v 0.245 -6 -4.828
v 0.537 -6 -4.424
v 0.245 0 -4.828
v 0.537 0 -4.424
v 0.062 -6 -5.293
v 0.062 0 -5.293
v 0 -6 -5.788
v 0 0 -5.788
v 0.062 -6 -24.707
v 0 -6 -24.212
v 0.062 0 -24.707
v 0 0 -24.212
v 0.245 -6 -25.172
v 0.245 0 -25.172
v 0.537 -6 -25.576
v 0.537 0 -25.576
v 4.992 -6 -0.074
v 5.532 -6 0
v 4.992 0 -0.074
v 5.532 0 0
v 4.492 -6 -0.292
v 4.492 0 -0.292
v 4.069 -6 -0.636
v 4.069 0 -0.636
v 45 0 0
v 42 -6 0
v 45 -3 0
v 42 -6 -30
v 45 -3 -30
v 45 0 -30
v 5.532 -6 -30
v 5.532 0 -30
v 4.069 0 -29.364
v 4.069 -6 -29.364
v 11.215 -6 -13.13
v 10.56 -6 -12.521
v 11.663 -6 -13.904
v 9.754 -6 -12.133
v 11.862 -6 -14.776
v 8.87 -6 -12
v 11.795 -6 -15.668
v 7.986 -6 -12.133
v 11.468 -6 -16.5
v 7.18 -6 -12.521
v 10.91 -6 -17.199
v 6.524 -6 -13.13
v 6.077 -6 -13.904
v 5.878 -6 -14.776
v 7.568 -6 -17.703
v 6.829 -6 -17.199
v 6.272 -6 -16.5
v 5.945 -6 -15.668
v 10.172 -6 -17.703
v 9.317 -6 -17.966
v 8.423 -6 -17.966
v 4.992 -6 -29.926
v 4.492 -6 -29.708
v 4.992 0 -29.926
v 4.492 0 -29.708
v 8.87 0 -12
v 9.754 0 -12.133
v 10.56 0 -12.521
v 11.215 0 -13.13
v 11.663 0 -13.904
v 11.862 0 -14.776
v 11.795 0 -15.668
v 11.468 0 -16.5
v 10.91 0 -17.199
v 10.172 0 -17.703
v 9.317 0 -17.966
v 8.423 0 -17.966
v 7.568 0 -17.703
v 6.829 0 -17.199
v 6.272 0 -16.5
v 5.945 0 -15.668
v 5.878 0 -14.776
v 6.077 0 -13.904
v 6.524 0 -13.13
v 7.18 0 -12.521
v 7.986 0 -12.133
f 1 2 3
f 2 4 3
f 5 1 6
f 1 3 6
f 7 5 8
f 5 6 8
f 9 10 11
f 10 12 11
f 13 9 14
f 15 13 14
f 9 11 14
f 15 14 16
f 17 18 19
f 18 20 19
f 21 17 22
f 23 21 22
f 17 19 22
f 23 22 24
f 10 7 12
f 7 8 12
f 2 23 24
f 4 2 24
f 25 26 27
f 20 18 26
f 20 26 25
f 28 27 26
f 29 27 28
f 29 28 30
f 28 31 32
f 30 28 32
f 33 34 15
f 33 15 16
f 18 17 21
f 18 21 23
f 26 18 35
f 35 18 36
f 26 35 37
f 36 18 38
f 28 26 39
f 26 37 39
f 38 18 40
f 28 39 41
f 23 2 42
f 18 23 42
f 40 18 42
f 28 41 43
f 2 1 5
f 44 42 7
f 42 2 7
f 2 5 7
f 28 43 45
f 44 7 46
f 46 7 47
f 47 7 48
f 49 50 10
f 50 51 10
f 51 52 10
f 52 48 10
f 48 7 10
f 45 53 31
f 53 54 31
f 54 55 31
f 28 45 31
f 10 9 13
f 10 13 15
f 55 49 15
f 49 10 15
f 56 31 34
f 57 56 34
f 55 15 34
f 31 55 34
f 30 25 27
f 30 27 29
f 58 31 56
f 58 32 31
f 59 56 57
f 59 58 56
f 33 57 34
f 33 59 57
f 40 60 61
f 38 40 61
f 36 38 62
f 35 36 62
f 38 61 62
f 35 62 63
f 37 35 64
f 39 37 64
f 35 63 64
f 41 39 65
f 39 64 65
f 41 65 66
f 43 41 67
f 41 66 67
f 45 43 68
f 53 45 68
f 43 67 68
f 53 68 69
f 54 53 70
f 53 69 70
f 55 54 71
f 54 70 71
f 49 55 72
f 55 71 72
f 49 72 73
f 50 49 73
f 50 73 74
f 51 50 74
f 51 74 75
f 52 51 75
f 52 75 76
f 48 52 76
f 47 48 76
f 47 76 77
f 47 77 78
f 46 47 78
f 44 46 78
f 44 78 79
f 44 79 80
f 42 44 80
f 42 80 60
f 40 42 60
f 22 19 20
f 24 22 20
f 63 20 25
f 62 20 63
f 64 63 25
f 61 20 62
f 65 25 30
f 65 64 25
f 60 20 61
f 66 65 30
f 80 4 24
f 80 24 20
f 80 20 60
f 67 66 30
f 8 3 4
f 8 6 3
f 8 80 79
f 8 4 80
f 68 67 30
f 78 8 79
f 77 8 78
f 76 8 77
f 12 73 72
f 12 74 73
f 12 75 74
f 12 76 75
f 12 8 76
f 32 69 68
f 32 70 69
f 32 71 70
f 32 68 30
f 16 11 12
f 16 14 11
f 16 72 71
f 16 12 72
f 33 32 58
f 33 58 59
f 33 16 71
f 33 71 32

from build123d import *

# Parameters (mm, degrees)
SKETCH_1_W          = 30
SKETCH_1_H          = 6
EXTRUDE_1_DEPTH     = 45
CHAMFER_1_SIZE      = 3
SKETCH_2_R          = 3
CUT_EXTRUDE_1_DEPTH = 55.415071442
CHAMFER_2_SIZE      = 5
CHAMFER_2_SIZE2     = 4.662575431
FILLET_1_R          = 2


with BuildPart() as part:
    # Эскиз1 → Вытянуть1 (new body)
    with BuildSketch(Plane(origin=(0, 0, 0), x_dir=(0, 0, -1), z_dir=(1, 0, 0))):
        with Locations((15, -3)):
            Rectangle(SKETCH_1_W, SKETCH_1_H)
    extrude(amount=EXTRUDE_1_DEPTH)

    # Фаска1
    chamfer_1_edges = [part.edges().sort_by_distance(p)[0] for p in [
        (45, -6, -15),
    ]]
    chamfer(chamfer_1_edges, length=CHAMFER_1_SIZE)

    # Эскиз2 → Вырез-Вытянуть1 (cut, through all)
    with BuildSketch(Plane(origin=(0, 0, 0), x_dir=(-1, 0, 0), z_dir=(0, 1, 0))):
        with Locations(Location((-8.86993337, -14.999999492, 0), (0, 0, 90))):
            Circle(SKETCH_2_R)
    extrude(amount=-CUT_EXTRUDE_1_DEPTH, mode=Mode.SUBTRACT)

    # Фаска2
    chamfer_2_edges = [part.edges().sort_by_distance(p)[0] for p in [
        (0, -3, -30),
        (0, -3, 0),
    ]]
    chamfer_2_side = [part.faces().sort_by_distance(p)[0] for p in [
        (0, -3, -15),
    ]]
    chamfer(chamfer_2_edges, length=CHAMFER_2_SIZE, length2=CHAMFER_2_SIZE2, reference=chamfer_2_side[0])

    # Скругление1
    fillet_1_edges = [part.edges().sort_by_distance(p)[0] for p in [
        (4.662575431, -3, -30),
        (0, -3, -5),
        (0, -3, -25),
        (4.662575431, -3, 0),
    ]]
    fillet(fillet_1_edges, radius=FILLET_1_R)


solid = part.part
